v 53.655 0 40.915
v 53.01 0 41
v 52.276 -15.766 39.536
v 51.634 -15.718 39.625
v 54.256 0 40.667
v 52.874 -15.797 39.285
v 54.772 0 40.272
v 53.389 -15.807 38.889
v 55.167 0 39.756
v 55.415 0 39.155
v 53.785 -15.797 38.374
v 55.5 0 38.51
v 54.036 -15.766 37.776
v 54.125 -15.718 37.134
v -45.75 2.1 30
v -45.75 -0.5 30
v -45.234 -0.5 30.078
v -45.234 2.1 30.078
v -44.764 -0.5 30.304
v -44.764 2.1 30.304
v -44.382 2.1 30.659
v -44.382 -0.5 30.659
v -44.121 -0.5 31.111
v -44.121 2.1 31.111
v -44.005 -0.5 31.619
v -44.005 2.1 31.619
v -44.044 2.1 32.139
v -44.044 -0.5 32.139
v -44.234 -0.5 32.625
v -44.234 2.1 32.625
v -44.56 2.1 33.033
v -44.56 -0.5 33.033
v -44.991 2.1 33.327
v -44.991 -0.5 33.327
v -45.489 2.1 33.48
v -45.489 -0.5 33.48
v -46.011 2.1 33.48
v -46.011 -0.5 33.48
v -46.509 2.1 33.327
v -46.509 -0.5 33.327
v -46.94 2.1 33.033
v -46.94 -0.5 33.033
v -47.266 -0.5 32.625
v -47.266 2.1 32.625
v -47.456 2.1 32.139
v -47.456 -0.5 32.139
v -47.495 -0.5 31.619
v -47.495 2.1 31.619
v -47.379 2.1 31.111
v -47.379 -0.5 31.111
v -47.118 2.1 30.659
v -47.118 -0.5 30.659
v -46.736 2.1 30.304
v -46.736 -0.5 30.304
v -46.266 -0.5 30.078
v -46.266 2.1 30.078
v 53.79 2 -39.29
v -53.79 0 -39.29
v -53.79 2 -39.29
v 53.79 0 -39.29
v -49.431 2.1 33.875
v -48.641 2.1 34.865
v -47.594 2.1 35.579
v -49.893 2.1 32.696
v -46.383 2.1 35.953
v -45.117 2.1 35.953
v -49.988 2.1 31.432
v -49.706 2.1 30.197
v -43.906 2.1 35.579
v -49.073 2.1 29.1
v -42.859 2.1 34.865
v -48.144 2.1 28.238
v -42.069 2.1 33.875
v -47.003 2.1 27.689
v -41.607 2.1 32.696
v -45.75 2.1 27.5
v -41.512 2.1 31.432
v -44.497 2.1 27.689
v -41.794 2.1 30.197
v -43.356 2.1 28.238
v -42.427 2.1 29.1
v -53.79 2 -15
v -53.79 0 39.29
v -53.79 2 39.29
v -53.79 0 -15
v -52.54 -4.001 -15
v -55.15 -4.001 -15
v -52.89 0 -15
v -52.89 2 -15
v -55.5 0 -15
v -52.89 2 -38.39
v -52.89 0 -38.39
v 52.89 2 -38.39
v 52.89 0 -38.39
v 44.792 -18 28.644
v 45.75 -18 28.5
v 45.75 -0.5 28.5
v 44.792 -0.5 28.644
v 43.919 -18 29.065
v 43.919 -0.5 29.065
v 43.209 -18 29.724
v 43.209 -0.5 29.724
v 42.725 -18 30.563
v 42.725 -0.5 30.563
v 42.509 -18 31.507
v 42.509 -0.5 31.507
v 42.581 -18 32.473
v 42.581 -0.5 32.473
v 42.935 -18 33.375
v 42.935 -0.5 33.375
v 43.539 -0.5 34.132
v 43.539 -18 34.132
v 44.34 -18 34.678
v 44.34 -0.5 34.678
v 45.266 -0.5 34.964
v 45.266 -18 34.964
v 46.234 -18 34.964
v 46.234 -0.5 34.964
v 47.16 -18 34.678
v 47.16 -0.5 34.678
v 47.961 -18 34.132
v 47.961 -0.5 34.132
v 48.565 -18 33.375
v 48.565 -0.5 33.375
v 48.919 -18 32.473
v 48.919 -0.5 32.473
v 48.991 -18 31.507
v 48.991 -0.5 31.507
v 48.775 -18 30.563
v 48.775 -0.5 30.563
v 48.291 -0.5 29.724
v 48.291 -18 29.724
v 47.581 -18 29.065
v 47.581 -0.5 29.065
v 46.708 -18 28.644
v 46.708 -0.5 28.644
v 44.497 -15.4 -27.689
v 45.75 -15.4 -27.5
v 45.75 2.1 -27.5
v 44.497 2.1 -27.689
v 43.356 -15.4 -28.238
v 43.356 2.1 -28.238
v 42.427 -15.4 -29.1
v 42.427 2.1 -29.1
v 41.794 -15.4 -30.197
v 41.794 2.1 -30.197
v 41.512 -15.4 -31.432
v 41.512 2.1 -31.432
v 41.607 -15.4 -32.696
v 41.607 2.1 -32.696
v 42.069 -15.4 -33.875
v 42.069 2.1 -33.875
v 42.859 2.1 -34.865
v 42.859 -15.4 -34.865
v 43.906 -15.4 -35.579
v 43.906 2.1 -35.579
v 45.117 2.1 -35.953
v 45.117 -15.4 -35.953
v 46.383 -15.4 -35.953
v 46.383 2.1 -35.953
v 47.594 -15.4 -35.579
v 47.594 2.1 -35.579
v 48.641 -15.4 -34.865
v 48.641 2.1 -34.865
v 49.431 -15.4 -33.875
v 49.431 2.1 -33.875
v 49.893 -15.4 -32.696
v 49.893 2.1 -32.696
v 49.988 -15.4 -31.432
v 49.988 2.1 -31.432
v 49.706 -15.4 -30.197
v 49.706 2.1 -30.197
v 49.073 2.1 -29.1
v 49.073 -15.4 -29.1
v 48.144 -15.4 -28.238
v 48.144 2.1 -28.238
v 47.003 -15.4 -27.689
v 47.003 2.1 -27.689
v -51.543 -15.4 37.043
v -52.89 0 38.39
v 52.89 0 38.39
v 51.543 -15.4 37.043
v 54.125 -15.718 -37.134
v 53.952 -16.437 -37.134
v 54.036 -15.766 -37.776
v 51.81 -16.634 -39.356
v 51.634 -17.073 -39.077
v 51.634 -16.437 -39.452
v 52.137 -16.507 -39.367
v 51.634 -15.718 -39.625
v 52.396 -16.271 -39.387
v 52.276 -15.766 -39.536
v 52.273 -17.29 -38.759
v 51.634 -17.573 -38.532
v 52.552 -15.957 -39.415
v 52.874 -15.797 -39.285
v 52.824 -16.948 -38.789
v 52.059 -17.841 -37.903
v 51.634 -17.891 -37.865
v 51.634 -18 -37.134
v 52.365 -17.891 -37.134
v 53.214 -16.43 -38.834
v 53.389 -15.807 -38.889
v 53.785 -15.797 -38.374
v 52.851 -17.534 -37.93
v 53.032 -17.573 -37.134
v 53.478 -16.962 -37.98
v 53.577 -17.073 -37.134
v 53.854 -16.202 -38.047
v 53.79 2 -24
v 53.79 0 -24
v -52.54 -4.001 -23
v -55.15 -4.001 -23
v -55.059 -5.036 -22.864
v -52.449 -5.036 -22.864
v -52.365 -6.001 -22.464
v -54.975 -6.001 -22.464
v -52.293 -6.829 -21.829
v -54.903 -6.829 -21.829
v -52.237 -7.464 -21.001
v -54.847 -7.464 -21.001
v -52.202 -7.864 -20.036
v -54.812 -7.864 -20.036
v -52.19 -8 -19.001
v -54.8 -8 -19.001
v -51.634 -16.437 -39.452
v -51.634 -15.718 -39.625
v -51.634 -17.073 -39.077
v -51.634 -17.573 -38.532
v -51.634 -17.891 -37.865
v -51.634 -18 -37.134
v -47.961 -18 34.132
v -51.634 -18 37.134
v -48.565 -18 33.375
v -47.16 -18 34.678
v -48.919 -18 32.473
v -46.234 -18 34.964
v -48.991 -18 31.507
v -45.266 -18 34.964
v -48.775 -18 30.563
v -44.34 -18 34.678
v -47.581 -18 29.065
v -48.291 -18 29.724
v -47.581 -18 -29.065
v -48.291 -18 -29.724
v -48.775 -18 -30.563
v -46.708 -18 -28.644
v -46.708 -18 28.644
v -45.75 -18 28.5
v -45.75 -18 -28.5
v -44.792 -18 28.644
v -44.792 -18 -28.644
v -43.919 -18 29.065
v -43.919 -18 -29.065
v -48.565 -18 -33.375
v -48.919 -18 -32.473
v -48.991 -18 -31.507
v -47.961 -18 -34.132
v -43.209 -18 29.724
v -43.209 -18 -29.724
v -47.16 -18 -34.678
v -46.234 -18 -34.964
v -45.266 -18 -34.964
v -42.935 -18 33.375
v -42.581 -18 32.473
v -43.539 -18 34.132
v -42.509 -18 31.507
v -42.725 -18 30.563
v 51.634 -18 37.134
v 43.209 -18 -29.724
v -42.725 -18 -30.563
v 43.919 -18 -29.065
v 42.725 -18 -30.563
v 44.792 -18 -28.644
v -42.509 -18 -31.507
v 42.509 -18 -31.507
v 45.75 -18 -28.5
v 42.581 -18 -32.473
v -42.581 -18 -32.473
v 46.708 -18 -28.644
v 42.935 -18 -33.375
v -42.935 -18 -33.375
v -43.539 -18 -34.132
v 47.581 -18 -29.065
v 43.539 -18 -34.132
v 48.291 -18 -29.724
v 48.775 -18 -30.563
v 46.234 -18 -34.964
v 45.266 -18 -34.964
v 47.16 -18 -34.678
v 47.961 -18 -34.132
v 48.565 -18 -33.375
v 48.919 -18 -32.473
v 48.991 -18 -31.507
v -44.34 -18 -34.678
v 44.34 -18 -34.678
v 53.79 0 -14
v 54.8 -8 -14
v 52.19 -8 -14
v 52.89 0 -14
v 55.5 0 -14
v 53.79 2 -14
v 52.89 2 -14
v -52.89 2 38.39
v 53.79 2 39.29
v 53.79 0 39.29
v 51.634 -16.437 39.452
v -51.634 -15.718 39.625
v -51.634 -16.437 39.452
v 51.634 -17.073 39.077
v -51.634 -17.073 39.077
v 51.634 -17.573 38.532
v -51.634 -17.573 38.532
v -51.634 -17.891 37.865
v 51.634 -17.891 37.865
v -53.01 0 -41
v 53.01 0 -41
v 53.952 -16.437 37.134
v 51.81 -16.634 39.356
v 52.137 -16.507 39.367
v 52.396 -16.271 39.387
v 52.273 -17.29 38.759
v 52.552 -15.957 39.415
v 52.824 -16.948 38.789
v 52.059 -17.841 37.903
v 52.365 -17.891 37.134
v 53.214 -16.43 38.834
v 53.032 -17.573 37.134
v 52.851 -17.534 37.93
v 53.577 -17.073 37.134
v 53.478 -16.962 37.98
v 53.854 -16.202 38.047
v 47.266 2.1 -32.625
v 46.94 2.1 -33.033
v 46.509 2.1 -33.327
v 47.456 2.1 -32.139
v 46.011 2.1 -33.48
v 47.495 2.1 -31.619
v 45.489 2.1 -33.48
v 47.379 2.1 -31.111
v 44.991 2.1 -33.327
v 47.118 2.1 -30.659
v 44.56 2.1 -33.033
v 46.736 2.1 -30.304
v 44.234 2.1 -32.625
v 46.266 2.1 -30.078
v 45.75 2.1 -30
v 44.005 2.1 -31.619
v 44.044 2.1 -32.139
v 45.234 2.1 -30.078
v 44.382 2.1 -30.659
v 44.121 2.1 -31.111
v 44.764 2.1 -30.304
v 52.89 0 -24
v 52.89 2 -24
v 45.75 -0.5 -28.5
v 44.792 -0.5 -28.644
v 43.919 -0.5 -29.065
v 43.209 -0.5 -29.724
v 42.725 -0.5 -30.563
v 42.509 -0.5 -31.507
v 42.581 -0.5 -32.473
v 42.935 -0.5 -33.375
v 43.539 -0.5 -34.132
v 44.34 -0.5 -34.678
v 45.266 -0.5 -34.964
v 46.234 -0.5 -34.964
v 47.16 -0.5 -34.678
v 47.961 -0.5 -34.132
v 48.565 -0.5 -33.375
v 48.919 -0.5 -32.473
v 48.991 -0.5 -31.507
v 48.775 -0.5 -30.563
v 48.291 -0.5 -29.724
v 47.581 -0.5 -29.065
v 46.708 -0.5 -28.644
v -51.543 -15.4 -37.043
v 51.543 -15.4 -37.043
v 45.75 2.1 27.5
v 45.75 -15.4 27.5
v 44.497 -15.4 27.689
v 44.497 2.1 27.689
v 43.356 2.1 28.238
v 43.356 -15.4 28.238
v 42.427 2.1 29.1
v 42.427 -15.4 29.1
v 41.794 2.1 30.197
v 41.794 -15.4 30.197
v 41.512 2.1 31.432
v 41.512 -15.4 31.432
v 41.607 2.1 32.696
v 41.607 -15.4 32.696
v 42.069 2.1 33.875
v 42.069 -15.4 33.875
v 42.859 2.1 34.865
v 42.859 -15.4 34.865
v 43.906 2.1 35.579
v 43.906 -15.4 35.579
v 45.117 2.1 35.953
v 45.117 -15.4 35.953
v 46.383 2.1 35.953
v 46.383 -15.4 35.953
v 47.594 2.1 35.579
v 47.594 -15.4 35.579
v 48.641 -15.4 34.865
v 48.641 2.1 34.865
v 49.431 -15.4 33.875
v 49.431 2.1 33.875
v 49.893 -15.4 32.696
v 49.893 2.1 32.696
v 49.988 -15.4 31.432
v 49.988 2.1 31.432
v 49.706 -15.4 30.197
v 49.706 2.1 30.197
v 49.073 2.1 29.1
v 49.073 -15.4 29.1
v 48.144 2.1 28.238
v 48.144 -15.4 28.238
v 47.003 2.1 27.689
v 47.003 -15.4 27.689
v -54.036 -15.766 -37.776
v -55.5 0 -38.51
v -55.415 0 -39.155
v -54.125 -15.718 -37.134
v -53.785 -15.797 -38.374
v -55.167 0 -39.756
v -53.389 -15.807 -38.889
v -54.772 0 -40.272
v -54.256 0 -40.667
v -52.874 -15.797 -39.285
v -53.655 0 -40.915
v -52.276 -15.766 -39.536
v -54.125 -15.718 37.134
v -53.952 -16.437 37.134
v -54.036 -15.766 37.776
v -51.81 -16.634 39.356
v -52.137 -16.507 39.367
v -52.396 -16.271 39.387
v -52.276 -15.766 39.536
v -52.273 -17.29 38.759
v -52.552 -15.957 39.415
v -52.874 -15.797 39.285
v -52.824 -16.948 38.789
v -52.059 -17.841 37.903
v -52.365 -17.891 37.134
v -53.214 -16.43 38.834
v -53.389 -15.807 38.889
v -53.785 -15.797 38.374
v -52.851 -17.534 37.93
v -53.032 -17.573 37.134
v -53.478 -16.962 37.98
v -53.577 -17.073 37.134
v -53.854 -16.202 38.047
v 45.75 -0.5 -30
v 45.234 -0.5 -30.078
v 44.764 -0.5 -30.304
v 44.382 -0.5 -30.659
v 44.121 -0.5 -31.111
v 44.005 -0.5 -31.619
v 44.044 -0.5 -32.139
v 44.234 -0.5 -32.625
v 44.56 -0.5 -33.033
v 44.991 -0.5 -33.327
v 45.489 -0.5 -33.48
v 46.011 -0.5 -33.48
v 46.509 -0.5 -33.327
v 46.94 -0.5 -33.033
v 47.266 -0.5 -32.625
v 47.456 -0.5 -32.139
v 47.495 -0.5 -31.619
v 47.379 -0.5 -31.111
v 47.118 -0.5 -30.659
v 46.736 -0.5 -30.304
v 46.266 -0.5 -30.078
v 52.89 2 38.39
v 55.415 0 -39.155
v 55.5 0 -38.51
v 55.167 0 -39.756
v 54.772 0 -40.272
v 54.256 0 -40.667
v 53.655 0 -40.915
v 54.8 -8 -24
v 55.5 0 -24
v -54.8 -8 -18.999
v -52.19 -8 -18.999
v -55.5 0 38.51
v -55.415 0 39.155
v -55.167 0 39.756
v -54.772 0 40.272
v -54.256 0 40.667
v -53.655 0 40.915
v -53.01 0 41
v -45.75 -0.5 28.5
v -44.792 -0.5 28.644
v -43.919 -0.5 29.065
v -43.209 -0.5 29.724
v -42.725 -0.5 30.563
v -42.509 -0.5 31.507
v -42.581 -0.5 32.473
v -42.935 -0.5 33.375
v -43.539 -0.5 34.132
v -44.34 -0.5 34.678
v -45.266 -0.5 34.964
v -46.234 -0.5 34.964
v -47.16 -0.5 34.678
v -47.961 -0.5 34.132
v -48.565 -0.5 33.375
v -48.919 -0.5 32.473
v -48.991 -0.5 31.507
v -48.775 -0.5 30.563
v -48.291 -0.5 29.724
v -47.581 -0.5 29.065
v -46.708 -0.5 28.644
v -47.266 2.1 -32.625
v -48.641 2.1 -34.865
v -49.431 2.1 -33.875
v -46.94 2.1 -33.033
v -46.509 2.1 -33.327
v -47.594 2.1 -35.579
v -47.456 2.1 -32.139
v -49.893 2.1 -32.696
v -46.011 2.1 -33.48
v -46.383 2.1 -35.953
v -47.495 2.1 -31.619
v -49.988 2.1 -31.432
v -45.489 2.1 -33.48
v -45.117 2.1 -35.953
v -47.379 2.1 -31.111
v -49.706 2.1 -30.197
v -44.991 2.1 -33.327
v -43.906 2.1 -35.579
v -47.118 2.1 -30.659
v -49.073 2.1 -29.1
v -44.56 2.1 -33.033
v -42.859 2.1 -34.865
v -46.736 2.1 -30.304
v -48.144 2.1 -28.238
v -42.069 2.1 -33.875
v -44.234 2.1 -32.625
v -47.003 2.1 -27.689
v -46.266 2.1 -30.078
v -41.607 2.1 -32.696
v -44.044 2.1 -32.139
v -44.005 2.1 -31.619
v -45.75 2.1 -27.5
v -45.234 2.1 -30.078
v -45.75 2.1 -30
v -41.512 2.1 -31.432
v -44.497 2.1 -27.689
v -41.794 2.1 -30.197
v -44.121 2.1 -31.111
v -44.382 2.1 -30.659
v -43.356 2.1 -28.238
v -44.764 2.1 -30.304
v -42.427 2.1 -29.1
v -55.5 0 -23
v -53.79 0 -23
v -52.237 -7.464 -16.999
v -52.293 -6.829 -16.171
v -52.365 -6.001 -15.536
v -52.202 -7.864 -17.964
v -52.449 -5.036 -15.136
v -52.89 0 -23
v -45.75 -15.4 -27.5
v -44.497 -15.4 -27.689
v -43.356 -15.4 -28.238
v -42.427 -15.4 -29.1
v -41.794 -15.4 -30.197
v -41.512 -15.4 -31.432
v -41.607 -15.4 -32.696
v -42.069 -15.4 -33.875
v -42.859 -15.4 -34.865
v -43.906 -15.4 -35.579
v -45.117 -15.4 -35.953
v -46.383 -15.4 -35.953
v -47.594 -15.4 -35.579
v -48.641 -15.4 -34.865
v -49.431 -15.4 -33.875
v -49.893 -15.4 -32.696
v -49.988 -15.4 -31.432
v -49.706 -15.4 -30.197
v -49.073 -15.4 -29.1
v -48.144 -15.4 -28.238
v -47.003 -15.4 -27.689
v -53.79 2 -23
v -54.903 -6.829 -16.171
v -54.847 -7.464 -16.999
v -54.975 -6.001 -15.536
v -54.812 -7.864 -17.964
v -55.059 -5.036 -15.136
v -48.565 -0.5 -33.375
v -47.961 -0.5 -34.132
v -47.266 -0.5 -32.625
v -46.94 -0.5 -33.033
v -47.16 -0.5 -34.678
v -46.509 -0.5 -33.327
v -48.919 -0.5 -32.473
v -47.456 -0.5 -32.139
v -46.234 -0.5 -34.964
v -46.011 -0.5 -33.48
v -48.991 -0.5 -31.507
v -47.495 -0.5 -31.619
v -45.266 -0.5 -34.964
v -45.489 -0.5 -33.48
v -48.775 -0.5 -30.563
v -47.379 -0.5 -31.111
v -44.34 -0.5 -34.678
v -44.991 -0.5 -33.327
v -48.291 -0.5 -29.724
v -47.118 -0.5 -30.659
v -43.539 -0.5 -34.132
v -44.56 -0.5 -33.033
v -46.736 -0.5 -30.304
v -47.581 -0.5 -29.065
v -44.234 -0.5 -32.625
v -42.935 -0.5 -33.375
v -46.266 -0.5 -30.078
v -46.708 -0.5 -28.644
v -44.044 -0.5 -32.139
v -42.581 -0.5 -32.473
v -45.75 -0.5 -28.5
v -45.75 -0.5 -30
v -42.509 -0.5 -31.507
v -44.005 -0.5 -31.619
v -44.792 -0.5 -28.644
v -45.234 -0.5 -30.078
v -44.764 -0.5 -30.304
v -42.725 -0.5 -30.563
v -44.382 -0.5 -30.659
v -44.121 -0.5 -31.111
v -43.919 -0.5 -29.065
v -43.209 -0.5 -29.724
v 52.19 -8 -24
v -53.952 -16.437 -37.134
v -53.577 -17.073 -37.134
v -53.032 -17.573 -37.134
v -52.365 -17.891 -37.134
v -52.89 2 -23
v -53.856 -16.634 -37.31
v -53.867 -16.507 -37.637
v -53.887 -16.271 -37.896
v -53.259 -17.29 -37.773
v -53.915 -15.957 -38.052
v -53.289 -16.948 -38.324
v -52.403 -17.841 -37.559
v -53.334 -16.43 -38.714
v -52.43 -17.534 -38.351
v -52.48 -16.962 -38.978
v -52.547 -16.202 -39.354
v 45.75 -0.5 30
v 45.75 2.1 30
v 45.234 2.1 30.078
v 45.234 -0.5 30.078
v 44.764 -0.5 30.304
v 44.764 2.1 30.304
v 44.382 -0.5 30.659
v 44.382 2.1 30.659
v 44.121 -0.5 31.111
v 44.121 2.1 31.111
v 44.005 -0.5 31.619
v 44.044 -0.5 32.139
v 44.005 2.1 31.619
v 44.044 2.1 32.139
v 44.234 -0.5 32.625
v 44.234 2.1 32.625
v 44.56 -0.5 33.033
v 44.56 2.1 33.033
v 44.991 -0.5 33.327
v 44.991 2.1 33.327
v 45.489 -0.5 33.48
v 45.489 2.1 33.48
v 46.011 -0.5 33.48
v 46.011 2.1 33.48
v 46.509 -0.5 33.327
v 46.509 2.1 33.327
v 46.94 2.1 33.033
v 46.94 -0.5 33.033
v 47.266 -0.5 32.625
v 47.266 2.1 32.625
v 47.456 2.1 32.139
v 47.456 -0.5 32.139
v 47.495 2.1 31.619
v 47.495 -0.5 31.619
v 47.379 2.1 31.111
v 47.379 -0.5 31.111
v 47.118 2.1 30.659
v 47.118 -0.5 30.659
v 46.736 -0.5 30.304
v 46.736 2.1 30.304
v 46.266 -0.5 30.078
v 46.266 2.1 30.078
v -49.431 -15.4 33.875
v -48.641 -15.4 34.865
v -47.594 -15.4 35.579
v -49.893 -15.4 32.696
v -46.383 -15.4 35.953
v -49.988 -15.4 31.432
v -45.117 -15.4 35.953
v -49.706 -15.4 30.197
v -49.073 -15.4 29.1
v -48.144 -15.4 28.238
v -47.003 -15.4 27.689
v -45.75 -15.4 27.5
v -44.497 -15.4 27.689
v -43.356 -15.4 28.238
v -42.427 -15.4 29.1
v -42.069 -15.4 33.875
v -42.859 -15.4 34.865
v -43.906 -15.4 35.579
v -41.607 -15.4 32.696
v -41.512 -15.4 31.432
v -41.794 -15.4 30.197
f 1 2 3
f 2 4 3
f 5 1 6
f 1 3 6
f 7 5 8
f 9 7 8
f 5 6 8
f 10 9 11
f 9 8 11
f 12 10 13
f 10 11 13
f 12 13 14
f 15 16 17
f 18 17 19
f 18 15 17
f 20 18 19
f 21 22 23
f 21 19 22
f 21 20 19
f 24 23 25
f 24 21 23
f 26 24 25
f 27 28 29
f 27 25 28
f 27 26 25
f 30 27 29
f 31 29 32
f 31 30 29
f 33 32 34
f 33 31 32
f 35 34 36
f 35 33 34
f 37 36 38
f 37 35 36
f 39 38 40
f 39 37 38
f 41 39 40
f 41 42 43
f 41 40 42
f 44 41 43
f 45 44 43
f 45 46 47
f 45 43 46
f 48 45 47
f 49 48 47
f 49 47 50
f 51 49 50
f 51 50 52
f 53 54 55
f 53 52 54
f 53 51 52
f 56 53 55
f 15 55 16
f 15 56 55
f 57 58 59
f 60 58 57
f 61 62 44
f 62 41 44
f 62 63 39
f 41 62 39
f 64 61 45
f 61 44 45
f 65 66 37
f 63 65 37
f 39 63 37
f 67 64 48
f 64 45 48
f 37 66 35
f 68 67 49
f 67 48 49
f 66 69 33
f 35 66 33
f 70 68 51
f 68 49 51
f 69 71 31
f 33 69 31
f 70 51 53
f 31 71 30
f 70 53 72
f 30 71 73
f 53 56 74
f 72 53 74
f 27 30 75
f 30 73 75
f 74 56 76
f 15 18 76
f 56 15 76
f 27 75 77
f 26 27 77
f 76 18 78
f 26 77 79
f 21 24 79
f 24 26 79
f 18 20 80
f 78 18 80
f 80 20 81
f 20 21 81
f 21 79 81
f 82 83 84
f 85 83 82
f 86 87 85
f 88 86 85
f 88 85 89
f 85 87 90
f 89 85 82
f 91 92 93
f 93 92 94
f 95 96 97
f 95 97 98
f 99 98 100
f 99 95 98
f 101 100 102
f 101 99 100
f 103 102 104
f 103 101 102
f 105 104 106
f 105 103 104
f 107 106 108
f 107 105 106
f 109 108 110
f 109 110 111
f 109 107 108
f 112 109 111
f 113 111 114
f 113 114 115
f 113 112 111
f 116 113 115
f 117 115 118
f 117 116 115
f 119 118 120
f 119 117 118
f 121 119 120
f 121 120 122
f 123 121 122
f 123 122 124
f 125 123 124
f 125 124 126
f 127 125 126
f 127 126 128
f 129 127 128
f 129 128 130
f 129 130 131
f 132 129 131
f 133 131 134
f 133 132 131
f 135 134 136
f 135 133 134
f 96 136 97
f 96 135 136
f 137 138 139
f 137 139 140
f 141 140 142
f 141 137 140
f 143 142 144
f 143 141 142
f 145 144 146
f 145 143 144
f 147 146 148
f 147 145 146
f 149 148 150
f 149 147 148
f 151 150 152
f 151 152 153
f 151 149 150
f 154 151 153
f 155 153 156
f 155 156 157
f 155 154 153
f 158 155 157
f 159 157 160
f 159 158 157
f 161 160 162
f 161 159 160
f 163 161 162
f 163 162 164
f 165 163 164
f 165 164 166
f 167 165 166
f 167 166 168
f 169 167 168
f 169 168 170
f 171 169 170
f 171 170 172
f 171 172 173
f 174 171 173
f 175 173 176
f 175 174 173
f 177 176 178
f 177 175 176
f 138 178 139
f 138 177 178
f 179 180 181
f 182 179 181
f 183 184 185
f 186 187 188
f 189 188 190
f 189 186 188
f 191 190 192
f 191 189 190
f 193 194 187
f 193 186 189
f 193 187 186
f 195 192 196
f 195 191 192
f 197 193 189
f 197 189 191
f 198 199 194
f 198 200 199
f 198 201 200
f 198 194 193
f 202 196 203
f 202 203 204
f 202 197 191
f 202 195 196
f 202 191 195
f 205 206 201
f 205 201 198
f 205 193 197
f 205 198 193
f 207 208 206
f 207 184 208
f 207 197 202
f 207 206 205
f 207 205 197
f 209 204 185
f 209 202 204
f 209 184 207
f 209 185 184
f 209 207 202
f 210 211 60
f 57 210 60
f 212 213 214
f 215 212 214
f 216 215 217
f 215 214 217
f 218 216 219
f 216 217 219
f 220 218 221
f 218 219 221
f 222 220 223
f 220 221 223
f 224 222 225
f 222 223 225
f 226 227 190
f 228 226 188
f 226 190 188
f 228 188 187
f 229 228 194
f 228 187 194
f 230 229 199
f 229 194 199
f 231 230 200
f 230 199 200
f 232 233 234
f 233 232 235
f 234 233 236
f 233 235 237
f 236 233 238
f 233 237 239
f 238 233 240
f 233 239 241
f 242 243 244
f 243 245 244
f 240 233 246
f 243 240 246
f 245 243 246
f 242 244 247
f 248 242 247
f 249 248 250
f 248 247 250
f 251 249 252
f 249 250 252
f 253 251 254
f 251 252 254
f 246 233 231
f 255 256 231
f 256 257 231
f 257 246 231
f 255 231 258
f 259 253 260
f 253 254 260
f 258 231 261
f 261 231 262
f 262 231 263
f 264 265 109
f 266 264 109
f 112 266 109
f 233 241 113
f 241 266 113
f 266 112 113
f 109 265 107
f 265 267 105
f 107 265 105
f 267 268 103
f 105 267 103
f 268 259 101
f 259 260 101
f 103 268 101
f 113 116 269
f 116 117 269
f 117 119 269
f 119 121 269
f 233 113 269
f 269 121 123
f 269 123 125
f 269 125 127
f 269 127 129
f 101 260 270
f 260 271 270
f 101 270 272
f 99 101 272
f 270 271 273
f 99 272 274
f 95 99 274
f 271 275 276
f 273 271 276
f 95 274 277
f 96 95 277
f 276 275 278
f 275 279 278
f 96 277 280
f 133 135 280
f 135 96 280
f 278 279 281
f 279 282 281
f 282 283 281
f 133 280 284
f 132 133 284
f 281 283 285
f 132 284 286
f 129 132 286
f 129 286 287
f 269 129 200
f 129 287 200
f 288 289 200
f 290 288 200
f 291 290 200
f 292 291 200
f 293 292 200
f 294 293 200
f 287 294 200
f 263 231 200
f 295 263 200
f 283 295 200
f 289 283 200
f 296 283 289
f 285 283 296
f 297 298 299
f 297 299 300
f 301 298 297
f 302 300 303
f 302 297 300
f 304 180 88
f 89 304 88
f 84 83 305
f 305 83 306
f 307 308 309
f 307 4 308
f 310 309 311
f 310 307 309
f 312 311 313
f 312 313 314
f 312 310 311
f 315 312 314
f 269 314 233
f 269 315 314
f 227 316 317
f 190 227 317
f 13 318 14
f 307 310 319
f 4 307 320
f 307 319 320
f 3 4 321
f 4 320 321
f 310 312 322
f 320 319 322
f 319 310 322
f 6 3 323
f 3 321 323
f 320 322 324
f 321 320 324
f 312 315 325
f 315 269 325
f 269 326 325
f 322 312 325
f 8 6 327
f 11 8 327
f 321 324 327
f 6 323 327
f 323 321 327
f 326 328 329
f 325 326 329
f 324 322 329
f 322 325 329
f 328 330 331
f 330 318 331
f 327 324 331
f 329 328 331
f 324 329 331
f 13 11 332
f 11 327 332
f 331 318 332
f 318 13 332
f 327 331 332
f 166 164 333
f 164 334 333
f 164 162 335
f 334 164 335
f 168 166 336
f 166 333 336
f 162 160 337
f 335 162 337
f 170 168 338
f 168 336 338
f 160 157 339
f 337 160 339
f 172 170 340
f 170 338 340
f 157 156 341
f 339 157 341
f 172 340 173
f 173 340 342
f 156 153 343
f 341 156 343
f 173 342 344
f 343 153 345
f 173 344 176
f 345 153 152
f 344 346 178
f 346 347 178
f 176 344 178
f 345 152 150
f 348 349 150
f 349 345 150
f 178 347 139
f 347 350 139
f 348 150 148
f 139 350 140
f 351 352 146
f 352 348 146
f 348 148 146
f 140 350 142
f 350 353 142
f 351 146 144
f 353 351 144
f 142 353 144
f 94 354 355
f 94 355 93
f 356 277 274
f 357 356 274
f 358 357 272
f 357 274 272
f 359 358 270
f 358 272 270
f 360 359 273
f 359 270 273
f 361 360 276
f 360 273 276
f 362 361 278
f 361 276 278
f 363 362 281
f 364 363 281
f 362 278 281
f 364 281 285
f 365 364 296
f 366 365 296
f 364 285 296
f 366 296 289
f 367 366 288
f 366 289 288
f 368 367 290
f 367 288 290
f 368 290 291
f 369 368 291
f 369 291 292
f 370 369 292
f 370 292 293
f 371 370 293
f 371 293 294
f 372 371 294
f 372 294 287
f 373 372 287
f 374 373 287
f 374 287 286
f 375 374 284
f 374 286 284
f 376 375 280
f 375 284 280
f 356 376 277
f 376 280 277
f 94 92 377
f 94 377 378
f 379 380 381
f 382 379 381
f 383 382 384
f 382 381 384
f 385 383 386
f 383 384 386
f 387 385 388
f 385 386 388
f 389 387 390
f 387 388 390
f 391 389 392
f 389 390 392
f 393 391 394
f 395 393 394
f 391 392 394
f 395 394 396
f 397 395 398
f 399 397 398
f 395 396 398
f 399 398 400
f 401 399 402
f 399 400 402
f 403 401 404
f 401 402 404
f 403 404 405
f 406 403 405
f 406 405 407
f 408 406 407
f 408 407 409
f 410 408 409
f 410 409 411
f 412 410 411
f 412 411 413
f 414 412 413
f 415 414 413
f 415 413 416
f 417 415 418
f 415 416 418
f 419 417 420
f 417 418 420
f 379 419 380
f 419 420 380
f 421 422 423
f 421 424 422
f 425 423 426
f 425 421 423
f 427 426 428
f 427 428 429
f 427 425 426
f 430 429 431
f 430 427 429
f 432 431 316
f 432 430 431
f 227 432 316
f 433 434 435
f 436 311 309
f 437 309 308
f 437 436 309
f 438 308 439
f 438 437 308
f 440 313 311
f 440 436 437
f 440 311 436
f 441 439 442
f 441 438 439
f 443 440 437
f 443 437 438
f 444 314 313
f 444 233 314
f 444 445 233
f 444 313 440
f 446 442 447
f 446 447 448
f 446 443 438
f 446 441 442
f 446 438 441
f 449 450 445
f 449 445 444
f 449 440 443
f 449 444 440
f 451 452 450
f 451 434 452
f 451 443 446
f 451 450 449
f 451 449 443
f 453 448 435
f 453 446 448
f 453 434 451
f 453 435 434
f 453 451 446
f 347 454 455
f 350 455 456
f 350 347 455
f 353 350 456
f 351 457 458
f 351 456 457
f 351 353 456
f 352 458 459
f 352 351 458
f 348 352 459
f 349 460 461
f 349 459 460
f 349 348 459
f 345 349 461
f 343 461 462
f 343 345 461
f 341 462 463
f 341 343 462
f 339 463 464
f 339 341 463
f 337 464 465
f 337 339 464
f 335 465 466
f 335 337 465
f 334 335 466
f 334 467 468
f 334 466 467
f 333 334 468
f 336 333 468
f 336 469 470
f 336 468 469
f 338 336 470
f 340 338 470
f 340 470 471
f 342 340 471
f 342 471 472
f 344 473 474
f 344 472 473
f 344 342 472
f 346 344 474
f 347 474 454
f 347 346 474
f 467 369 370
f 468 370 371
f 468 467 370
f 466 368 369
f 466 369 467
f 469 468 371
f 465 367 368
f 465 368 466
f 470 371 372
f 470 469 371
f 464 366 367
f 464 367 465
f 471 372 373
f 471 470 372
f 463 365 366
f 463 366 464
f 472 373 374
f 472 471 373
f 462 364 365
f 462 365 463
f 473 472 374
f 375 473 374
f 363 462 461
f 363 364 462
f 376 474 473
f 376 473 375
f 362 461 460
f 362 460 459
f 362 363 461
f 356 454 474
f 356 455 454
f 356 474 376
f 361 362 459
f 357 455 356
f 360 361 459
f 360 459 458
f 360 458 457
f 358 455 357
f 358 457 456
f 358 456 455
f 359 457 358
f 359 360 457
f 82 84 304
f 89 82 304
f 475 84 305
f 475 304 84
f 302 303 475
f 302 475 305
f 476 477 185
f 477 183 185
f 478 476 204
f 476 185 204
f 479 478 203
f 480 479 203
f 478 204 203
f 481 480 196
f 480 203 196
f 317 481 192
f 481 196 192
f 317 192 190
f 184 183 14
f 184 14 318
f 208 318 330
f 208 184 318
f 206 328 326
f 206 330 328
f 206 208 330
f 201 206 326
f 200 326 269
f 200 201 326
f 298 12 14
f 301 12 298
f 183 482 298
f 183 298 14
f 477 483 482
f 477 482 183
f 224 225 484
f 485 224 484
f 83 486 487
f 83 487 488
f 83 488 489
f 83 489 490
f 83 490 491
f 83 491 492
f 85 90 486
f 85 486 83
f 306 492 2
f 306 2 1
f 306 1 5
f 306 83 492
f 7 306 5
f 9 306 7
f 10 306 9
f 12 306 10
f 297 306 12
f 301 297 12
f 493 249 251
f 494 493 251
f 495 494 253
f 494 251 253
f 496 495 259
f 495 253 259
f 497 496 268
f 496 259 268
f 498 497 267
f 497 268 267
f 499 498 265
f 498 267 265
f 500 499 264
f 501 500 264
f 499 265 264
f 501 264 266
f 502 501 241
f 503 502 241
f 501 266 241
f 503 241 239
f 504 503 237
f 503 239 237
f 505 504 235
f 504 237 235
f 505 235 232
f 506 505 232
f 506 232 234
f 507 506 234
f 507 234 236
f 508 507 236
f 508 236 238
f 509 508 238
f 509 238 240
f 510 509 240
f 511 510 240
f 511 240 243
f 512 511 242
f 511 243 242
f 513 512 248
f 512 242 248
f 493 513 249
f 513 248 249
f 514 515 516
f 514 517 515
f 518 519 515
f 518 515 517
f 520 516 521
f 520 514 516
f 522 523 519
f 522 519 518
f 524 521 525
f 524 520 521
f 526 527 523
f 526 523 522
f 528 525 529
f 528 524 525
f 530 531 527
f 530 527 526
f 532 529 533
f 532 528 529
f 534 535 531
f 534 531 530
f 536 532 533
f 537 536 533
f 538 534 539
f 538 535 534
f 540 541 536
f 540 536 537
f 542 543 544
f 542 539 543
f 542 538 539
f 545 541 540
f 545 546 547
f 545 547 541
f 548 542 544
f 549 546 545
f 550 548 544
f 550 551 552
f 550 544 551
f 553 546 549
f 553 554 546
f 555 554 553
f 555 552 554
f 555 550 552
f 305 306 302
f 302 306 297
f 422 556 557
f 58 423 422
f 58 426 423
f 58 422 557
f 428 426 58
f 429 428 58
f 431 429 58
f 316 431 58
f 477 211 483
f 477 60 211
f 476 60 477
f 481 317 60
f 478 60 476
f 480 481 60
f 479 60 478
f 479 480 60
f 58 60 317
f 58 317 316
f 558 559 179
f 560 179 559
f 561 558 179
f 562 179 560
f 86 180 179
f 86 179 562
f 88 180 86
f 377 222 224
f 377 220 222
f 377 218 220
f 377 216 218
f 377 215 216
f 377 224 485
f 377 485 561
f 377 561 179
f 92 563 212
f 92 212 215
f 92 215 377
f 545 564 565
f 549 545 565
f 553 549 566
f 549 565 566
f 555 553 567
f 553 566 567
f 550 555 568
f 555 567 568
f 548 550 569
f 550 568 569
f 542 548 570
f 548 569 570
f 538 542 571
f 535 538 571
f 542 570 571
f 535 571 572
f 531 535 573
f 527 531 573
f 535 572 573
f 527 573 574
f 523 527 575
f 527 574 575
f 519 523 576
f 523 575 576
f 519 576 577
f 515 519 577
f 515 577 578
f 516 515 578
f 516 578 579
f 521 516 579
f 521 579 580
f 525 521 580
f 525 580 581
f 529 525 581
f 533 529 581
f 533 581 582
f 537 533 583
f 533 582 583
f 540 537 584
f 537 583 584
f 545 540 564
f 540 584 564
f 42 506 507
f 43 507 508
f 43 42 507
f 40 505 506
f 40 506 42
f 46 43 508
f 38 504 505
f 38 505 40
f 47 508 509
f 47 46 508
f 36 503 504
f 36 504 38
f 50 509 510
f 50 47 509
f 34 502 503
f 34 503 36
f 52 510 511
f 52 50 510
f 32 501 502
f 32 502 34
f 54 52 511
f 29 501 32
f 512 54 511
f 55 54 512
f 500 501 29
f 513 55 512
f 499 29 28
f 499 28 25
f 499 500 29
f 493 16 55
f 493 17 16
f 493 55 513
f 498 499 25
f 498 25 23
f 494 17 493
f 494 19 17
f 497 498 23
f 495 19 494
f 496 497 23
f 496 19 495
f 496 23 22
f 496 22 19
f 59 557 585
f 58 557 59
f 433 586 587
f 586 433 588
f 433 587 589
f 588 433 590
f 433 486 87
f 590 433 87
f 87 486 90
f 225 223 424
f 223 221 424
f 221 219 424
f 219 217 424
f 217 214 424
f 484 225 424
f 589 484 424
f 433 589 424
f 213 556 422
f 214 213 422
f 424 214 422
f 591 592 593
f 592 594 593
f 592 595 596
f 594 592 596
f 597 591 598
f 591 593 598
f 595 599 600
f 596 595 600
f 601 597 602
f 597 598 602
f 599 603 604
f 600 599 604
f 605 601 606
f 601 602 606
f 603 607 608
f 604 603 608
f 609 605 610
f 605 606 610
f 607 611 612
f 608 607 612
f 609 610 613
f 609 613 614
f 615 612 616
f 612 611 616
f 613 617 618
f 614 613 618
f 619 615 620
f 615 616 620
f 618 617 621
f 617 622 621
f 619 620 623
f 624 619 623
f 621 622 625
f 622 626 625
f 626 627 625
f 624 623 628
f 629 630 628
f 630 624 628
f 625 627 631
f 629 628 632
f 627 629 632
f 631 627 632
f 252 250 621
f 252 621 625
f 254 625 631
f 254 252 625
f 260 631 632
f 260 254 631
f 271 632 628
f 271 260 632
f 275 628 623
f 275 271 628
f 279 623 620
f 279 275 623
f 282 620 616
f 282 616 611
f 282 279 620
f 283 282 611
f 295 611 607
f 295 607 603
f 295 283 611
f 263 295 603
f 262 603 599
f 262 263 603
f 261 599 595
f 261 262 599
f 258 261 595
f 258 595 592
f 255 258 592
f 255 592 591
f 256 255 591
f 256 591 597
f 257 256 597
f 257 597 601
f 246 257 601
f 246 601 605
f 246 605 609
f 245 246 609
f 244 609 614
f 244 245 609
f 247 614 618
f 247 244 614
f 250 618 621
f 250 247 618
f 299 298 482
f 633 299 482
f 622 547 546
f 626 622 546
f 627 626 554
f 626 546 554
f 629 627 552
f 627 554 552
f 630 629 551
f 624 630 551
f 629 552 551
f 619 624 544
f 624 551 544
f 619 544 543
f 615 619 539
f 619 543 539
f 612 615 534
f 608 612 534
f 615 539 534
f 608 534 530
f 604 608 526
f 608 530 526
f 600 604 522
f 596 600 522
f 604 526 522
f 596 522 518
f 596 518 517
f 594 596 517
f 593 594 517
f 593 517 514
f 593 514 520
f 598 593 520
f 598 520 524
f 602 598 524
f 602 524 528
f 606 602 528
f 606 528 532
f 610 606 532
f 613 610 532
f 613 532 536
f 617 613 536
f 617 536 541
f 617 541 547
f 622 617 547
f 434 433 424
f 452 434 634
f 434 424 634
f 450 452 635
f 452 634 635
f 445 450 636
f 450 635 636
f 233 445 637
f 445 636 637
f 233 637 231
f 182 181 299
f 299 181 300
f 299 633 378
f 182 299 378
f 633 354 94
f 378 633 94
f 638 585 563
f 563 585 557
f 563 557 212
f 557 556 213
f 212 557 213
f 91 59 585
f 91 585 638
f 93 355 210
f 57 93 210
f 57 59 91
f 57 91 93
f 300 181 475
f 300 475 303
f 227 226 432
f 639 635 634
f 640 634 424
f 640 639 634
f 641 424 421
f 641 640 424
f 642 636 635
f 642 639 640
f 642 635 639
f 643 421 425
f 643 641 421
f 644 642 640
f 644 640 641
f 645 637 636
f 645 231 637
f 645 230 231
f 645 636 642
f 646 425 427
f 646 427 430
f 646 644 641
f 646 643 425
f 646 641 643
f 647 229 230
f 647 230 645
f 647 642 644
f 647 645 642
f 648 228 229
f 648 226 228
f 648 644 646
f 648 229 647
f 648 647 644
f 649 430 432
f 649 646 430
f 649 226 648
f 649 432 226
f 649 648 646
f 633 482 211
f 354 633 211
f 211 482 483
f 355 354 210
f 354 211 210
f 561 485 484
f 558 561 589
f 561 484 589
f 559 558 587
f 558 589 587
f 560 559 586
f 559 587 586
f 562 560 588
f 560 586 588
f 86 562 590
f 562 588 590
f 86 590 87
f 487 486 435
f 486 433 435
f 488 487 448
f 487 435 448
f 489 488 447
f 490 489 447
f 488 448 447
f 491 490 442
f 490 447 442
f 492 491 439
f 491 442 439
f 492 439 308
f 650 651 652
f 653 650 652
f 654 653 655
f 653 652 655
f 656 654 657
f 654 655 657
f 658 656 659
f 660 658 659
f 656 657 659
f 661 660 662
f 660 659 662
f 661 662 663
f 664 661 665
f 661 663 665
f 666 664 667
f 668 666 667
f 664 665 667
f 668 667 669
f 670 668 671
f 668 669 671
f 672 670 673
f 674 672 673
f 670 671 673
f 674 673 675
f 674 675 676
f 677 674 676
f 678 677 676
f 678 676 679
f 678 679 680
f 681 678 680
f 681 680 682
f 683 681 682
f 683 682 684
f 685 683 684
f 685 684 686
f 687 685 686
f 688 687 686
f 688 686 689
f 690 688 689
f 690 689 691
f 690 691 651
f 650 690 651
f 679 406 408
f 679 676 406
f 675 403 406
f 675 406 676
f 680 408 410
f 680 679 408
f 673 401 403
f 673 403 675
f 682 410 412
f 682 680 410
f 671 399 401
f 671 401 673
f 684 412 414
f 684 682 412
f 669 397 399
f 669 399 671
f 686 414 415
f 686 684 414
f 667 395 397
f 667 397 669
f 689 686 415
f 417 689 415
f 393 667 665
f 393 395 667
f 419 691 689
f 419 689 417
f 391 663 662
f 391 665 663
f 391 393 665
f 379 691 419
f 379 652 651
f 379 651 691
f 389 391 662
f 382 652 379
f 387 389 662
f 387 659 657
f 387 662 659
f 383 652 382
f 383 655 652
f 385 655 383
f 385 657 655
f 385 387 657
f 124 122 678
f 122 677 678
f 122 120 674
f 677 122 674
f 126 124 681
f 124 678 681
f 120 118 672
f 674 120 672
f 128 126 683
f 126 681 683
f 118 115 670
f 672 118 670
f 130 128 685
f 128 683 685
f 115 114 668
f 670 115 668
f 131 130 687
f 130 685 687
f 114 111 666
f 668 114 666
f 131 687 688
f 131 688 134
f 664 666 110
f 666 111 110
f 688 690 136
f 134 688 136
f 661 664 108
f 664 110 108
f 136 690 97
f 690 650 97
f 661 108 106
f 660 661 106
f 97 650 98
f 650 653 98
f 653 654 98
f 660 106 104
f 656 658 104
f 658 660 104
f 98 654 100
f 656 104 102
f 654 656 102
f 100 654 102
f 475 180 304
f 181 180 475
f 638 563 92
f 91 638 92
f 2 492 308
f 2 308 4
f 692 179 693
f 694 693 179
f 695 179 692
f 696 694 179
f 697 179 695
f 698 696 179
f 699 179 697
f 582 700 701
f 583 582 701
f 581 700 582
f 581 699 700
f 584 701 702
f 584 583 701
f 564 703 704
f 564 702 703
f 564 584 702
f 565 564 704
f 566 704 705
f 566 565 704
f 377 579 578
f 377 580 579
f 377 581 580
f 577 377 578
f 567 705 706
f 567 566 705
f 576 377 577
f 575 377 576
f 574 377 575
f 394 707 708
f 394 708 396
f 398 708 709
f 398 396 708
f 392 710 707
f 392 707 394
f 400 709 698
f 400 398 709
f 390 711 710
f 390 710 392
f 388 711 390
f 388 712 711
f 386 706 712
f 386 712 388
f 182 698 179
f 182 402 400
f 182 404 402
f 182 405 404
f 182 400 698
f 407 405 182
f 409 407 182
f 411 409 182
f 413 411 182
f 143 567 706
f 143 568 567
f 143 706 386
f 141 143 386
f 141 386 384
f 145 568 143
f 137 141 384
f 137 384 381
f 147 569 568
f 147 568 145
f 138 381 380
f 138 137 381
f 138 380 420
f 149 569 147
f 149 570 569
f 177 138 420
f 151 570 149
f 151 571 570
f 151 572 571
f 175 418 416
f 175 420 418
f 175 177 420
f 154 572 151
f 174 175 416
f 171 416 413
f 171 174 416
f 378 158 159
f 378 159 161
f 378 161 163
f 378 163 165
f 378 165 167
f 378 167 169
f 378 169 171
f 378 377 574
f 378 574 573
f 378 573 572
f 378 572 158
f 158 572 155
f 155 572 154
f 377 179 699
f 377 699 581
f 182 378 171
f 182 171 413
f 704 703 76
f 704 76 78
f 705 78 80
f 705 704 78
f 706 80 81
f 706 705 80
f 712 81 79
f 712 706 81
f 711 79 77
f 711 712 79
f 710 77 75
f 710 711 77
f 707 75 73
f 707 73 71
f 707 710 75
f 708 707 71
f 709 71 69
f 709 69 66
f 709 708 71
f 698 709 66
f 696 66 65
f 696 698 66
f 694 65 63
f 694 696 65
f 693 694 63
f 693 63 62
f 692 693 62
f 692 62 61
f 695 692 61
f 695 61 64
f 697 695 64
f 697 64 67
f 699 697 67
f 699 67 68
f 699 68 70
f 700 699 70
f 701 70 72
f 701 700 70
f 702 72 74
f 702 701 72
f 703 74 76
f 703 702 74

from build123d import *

# Parameters (mm, degrees)
SKETCH_1_W               = 111
SKETCH_1_H               = 82
EXTRUDE_1_DEPTH          = 18
EXTRUDE_1_DRAFT          = -5
SHELL_1_T                = -2.6
FILLET_1_R               = 2.5
SKETCH_2_W               = 107.580136844
SKETCH_2_H               = 78.580136844
SKETCH_2_W_2             = 105.780136844
SKETCH_2_H_2             = 76.780136844
EXTRUDE_2_DEPTH          = 2
SKETCH_4_R               = 4.25
EXTRUDE_3_DEPTH          = 17.5
MIRROR_2_COPY_1_SKETCH_R = 4.25
MIRROR_2_COPY_1_DEPTH    = 17.5
SKETCH_5_R               = 3.25
CUT_EXTRUDE_2_DEPTH      = 17.5
MIRROR_4_COPY_1_SKETCH_R = 3.25
MIRROR_4_COPY_1_DEPTH    = 17.5
SKETCH_6_R               = 1.75
CUT_EXTRUDE_3_DEPTH      = 3
MIRROR_6_COPY_1_SKETCH_R = 1.75
MIRROR_6_COPY_1_DEPTH    = 3
CUT_EXTRUDE_4_DEPTH      = 5
SKETCH_8_W               = 10
SKETCH_8_H               = 10
CUT_EXTRUDE_5_DEPTH      = 5


with BuildPart() as part:
    # Эскиз1 → Бобышка-Вытянуть1 (with draft: the straight prism first)
    with BuildSketch(Plane(origin=(0, 0, 0), x_dir=(1, 0, 0), z_dir=(0, 1, 0))):
        Rectangle(SKETCH_1_W, SKETCH_1_H)
    extrude(amount=-EXTRUDE_1_DEPTH)
    # Бобышка-Вытянуть1: the draft: its side faces are tilted about the plane it starts from
    extrude_1_sides = [part.faces().sort_by_distance(p)[0] for p in [
        (-55.5, -9, 0),
        (0, -9, 41),
        (55.5, -9, 0),
        (0, -9, -41),
    ]]
    draft(extrude_1_sides, Plane(origin=(0, 0, 0), x_dir=(1, 0, 0), z_dir=(0, 1, 0)), EXTRUDE_1_DRAFT)

    # Оболочка1
    shell_1_openings = [part.faces().sort_by_distance(p)[0] for p in [
        (0, 0, 0),
    ]]
    offset(amount=SHELL_1_T, openings=shell_1_openings, kind=Kind.INTERSECTION)

    # Скругление1
    fillet_1_edges = [part.edges().sort_by_distance(p)[0] for p in [
        (53.925204057, -18, 0),
        (0, -18, -39.425204057),
        (-53.925204057, -18, 0),
        (0, -18, 39.425204057),
        (-54.712602028, -9, -40.212602028),
        (54.712602028, -9, -40.212602028),
        (54.712602028, -9, 40.212602028),
        (-54.712602028, -9, 40.212602028),
    ]]
    fillet(fillet_1_edges, radius=FILLET_1_R)

    # Эскиз2 → Бобышка-Вытянуть2 (add)
    with BuildSketch(Plane(origin=(0, 0, 0), x_dir=(1, 0, 0), z_dir=(0, 1, 0))):
        Rectangle(SKETCH_2_W, SKETCH_2_H)
        Rectangle(SKETCH_2_W_2, SKETCH_2_H_2, mode=Mode.SUBTRACT)
    extrude(amount=EXTRUDE_2_DEPTH)

    # Эскиз4 → Бобышка-Вытянуть3 (add)
    with BuildSketch(Plane(origin=(0, -15.4, 0), x_dir=(1, 0, 0), z_dir=(0, 1, 0))):
        with Locations(Location((-45.75, 31.75, 0), (0, 0, 270))):
            Circle(SKETCH_4_R)
    extrude_3 = extrude(amount=EXTRUDE_3_DEPTH)

    # Зеркальное отражение1: Бобышка-Вытянуть3 across plane
    add(extrude_3.mirror(Plane(origin=(0, 0, 0), x_dir=(0, 0, 1), z_dir=(1, 0, 0))))

    # Зеркальное отражение2: Бобышка-Вытянуть3 across plane
    add(extrude_3.mirror(Plane.XY))

    # Зеркальное отражение2 copy 1 sketch → Зеркальное отражение2 copy 1 (add)
    with BuildSketch(Plane(origin=(0, -15.4, 0), x_dir=(-1, 0, 0), z_dir=(0, 1, 0))):
        with Locations(Location((-45.75, 31.75, 0), (0, 0, 270))):
            Circle(MIRROR_2_COPY_1_SKETCH_R)
    extrude(amount=MIRROR_2_COPY_1_DEPTH)

    # Эскиз5 → Вырез-Вытянуть2 (cut)
    with BuildSketch(Plane(origin=(0, -18, 0), x_dir=(1, 0, 0), z_dir=(0, 1, 0))):
        with Locations(Location((-45.75, 31.75, 0), (0, 0, 270))):
            Circle(SKETCH_5_R)
    cut_extrude_2 = extrude(amount=CUT_EXTRUDE_2_DEPTH, mode=Mode.SUBTRACT)

    # Зеркальное отражение3: Вырез-Вытянуть2 across plane
    add(cut_extrude_2.mirror(Plane(origin=(0, 0, 0), x_dir=(0, 0, 1), z_dir=(1, 0, 0))), mode=Mode.SUBTRACT)

    # Зеркальное отражение4: Вырез-Вытянуть2 across plane
    add(cut_extrude_2.mirror(Plane.XY), mode=Mode.SUBTRACT)

    # Зеркальное отражение4 copy 1 sketch → Зеркальное отражение4 copy 1 (cut)
    with BuildSketch(Plane(origin=(0, -18, 0), x_dir=(-1, 0, 0), z_dir=(0, 1, 0))):
        with Locations(Location((-45.75, 31.75, 0), (0, 0, 270))):
            Circle(MIRROR_4_COPY_1_SKETCH_R)
    extrude(amount=MIRROR_4_COPY_1_DEPTH, mode=Mode.SUBTRACT)

    # Эскиз6 → Вырез-Вытянуть3 (cut)
    with BuildSketch(Plane(origin=(0, 2.1, 0), x_dir=(-1, 0, 0), z_dir=(0, 1, 0))):
        with Locations(Location((45.75, -31.75, 0), (0, 0, 90))):
            Circle(SKETCH_6_R)
    cut_extrude_3 = extrude(amount=-CUT_EXTRUDE_3_DEPTH, mode=Mode.SUBTRACT)

    # Зеркальное отражение5: Вырез-Вытянуть3 across plane
    add(cut_extrude_3.mirror(Plane(origin=(0, 0, 0), x_dir=(0, 0, 1), z_dir=(1, 0, 0))), mode=Mode.SUBTRACT)

    # Зеркальное отражение6: Вырез-Вытянуть3 across plane
    add(cut_extrude_3.mirror(Plane.XY), mode=Mode.SUBTRACT)

    # Зеркальное отражение6 copy 1 sketch → Зеркальное отражение6 copy 1 (cut)
    with BuildSketch(Plane(origin=(0, 2.1, 0), x_dir=(1, 0, 0), z_dir=(0, 1, 0))):
        with Locations(Location((45.75, -31.75, 0), (0, 0, 90))):
            Circle(MIRROR_6_COPY_1_SKETCH_R)
    extrude(amount=-MIRROR_6_COPY_1_DEPTH, mode=Mode.SUBTRACT)

    # Эскиз7 → Вырез-Вытянуть4 (cut)
    with BuildSketch(Plane(origin=(-55.5, 0, 0), x_dir=(0, 0, -1), z_dir=(1, 0, 0))):
        with BuildLine():
            Line((19.001, -8), (18.999, -8))
            ThreePointArc((18.999, -8), (16.171279982, -6.828720018), (15, -4.001))
            Line((15, -4.001), (15, 2))
            Line((15, 2), (23, 2))
            Line((23, 2), (23, -4.001))
            ThreePointArc((23, -4.001), (21.828720018, -6.828720018), (19.001, -8))
        make_face()
    extrude(amount=CUT_EXTRUDE_4_DEPTH, mode=Mode.SUBTRACT)

    # Эскиз8 → Вырез-Вытянуть5 (cut)
    with BuildSketch(Plane(origin=(55.5, 0, 0), x_dir=(0, 0, -1), z_dir=(1, 0, 0))):
        with Locations((19, -3)):
            Rectangle(SKETCH_8_W, SKETCH_8_H)
    extrude(amount=-CUT_EXTRUDE_5_DEPTH, mode=Mode.SUBTRACT)


solid = part.part
